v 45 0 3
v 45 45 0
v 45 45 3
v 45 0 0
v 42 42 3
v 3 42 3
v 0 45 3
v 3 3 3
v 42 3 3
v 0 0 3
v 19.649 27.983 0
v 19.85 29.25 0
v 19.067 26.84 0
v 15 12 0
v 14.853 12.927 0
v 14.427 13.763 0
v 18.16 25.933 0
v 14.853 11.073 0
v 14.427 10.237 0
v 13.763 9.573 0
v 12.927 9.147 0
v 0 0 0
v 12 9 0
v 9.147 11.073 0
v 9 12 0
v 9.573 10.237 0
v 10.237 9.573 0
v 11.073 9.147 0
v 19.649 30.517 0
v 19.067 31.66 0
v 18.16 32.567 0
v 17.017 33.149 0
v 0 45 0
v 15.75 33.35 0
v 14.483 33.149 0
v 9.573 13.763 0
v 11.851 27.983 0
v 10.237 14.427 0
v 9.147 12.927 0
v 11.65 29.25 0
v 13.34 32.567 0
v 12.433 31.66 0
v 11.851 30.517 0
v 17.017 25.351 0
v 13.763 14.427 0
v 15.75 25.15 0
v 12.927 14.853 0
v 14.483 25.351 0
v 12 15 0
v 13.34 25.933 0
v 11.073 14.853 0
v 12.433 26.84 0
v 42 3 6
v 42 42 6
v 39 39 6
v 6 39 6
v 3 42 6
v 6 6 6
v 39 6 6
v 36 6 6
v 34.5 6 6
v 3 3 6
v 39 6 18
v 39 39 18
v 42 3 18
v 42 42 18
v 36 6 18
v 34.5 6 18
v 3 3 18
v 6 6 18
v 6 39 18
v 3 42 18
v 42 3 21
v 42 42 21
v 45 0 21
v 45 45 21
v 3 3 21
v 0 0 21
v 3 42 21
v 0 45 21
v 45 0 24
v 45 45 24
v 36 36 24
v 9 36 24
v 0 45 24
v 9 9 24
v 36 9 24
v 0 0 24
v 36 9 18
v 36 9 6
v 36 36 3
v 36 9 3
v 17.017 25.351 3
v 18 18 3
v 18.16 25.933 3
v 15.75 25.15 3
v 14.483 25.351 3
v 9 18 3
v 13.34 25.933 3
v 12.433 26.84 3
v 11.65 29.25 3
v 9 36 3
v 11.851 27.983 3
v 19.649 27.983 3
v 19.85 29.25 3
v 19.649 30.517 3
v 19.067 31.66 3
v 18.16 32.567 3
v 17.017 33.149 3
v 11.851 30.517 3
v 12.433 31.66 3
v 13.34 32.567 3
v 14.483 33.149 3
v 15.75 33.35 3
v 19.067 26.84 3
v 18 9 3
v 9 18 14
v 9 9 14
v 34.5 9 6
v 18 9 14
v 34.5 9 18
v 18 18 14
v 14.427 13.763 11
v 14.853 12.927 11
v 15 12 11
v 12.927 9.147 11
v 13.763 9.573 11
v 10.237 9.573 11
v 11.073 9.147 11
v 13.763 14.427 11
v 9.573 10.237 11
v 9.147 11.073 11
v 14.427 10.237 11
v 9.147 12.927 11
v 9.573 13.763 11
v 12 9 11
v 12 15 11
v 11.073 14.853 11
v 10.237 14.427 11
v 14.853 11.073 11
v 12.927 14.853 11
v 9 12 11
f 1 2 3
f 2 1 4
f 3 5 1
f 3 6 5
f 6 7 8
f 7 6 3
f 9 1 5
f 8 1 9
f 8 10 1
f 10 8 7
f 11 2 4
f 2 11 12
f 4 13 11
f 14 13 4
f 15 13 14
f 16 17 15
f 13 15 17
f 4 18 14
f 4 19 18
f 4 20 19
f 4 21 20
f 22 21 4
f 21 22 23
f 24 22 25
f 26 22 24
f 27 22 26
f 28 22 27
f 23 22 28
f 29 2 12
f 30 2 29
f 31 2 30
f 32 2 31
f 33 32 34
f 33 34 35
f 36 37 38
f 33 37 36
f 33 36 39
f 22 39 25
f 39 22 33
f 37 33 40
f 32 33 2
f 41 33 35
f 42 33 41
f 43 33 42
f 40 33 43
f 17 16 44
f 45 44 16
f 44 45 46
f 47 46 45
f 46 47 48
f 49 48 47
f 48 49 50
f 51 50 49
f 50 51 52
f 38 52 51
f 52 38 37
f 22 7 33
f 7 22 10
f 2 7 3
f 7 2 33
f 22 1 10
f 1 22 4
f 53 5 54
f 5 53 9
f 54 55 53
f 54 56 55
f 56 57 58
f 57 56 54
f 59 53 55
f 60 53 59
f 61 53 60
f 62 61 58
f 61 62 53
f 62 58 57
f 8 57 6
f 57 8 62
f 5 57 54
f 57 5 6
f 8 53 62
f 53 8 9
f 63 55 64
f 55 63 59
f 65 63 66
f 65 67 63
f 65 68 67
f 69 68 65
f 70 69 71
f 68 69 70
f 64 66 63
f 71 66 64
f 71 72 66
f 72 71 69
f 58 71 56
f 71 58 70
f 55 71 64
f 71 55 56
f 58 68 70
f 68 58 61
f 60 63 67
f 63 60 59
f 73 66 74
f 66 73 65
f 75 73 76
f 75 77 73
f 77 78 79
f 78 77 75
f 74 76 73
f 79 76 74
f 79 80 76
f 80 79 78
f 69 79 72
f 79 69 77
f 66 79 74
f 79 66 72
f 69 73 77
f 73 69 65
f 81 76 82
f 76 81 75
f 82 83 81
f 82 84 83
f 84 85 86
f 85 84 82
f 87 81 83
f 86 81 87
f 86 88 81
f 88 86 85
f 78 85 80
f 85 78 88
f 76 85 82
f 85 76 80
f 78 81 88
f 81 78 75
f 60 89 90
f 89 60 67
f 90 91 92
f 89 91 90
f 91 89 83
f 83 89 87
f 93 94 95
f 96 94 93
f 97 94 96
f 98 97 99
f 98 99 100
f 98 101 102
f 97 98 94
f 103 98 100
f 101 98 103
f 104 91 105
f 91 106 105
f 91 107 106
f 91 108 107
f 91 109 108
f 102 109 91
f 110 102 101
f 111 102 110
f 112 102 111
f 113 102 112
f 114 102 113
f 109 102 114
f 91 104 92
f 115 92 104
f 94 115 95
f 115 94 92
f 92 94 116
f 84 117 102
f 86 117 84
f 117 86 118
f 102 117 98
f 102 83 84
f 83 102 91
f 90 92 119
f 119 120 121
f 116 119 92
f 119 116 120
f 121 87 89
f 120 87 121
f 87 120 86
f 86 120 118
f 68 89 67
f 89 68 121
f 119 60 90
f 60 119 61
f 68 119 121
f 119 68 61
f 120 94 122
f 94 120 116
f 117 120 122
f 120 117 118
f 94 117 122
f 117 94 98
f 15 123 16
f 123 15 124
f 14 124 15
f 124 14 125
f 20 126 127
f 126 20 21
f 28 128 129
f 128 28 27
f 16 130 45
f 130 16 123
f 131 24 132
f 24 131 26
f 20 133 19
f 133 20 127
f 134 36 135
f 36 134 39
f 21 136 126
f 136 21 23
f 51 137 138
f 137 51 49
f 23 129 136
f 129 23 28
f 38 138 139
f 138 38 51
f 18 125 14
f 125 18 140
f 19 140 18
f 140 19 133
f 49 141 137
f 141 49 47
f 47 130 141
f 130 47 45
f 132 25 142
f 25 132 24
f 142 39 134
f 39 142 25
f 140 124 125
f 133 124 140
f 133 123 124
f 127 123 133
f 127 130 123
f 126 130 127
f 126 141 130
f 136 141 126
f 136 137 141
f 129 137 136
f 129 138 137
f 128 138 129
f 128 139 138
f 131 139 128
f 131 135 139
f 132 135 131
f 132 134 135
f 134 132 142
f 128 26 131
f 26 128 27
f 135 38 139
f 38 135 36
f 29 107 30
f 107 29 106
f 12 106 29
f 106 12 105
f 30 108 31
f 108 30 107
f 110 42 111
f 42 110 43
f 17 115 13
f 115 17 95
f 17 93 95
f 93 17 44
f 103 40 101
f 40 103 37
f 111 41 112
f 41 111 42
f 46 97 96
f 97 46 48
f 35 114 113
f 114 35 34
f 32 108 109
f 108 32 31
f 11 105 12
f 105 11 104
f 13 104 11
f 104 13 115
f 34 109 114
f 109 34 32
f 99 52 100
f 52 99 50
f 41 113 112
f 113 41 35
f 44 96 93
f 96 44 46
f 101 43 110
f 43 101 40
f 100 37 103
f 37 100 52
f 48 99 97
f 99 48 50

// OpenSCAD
// Copyright 2018 Marcos Del Sol Vives
// SPDX-License-Identifier: ISC

// Tweak these parameters to your hearth's content

// Rendering quality
$fn = 20;

// Length of *each* side of the LED
led_length = 33;

// Height of the LED strip
led_height = 12;

// Thickness of the LED strip, at the max spot
led_thickness = 3;

// Height of the tabs that hold the glass
glass_support_height = 3;

// Thickness of the glass
glass_thickness = 3;

// Thickness of the bezel on top and on the bottom, protecting the edges of the glass
bezel_height = 3;

// Thickness of the walls
wall_thickness = 3;

// Thickness of the hole to pass the cabling to the strip
cable_thickness = 1.5;

// Support stick hole depth
support_depth = 11;

// Diameter of the support stick
support_diam = 6;

// DC jack hole
dc_jack_pos_x = 0.35;
dc_jack_pos_y = 0.65;
dc_jack_diam = 8.2;

// END OF CONFIGURATION

totalheight = led_height + 2 * glass_support_height + 2 * bezel_height;
totalside = led_length + 2 * led_thickness + 2 * glass_thickness;

difference() {
    union() {
        difference() {
            union() {
                // Bottom bezel
                cube([totalside, totalside, bezel_height]);

                // Bottom glass support
                translate([glass_thickness, glass_thickness, bezel_height])
                    cube([led_length + 2 * led_thickness, led_length + 2 * led_thickness, glass_support_height]);

                // LED support
                translate([glass_thickness + led_thickness, glass_thickness + led_thickness, bezel_height + glass_support_height])
                    cube([led_length, led_length, led_height]);

                // Top glass support
                translate([glass_thickness, glass_thickness, bezel_height + glass_support_height + led_height])
                    cube([led_length + 2 * led_thickness, led_length + 2 * led_thickness, glass_support_height]);

                // Top bezel
                translate([0, 0, bezel_height + glass_support_height + led_height + glass_support_height])
                    cube([totalside, totalside, bezel_height]);
            };
            
            // Make it hollow to fit the driver inside
            translate([glass_thickness + led_thickness + wall_thickness, glass_thickness + led_thickness + wall_thickness, wall_thickness]) {
                cube([led_length - 2 * wall_thickness, led_length - 2 *wall_thickness, totalheight - wall_thickness]);
            };

            // Make hole for the LED cable
            translate([glass_thickness + led_thickness + led_length - wall_thickness - cable_thickness, glass_thickness + led_thickness, bezel_height + glass_support_height])
                cube([cable_thickness, wall_thickness, led_height]);
        };

        // Support part
        translate([glass_thickness + led_thickness + wall_thickness, glass_thickness + led_thickness + wall_thickness, 0])
            cube([support_diam + wall_thickness, support_diam + wall_thickness, support_depth + wall_thickness]);
    };

    // Hole in support
    translate([glass_thickness + led_thickness + wall_thickness + support_diam / 2, glass_thickness + led_thickness + wall_thickness + support_diam / 2, 0])
        cylinder(d=support_diam, h=support_depth);

    // Hole for DC jack
    translate([totalside * dc_jack_pos_x, totalside * dc_jack_pos_y, 0])
        cylinder(d=dc_jack_diam, h=wall_thickness);
};
